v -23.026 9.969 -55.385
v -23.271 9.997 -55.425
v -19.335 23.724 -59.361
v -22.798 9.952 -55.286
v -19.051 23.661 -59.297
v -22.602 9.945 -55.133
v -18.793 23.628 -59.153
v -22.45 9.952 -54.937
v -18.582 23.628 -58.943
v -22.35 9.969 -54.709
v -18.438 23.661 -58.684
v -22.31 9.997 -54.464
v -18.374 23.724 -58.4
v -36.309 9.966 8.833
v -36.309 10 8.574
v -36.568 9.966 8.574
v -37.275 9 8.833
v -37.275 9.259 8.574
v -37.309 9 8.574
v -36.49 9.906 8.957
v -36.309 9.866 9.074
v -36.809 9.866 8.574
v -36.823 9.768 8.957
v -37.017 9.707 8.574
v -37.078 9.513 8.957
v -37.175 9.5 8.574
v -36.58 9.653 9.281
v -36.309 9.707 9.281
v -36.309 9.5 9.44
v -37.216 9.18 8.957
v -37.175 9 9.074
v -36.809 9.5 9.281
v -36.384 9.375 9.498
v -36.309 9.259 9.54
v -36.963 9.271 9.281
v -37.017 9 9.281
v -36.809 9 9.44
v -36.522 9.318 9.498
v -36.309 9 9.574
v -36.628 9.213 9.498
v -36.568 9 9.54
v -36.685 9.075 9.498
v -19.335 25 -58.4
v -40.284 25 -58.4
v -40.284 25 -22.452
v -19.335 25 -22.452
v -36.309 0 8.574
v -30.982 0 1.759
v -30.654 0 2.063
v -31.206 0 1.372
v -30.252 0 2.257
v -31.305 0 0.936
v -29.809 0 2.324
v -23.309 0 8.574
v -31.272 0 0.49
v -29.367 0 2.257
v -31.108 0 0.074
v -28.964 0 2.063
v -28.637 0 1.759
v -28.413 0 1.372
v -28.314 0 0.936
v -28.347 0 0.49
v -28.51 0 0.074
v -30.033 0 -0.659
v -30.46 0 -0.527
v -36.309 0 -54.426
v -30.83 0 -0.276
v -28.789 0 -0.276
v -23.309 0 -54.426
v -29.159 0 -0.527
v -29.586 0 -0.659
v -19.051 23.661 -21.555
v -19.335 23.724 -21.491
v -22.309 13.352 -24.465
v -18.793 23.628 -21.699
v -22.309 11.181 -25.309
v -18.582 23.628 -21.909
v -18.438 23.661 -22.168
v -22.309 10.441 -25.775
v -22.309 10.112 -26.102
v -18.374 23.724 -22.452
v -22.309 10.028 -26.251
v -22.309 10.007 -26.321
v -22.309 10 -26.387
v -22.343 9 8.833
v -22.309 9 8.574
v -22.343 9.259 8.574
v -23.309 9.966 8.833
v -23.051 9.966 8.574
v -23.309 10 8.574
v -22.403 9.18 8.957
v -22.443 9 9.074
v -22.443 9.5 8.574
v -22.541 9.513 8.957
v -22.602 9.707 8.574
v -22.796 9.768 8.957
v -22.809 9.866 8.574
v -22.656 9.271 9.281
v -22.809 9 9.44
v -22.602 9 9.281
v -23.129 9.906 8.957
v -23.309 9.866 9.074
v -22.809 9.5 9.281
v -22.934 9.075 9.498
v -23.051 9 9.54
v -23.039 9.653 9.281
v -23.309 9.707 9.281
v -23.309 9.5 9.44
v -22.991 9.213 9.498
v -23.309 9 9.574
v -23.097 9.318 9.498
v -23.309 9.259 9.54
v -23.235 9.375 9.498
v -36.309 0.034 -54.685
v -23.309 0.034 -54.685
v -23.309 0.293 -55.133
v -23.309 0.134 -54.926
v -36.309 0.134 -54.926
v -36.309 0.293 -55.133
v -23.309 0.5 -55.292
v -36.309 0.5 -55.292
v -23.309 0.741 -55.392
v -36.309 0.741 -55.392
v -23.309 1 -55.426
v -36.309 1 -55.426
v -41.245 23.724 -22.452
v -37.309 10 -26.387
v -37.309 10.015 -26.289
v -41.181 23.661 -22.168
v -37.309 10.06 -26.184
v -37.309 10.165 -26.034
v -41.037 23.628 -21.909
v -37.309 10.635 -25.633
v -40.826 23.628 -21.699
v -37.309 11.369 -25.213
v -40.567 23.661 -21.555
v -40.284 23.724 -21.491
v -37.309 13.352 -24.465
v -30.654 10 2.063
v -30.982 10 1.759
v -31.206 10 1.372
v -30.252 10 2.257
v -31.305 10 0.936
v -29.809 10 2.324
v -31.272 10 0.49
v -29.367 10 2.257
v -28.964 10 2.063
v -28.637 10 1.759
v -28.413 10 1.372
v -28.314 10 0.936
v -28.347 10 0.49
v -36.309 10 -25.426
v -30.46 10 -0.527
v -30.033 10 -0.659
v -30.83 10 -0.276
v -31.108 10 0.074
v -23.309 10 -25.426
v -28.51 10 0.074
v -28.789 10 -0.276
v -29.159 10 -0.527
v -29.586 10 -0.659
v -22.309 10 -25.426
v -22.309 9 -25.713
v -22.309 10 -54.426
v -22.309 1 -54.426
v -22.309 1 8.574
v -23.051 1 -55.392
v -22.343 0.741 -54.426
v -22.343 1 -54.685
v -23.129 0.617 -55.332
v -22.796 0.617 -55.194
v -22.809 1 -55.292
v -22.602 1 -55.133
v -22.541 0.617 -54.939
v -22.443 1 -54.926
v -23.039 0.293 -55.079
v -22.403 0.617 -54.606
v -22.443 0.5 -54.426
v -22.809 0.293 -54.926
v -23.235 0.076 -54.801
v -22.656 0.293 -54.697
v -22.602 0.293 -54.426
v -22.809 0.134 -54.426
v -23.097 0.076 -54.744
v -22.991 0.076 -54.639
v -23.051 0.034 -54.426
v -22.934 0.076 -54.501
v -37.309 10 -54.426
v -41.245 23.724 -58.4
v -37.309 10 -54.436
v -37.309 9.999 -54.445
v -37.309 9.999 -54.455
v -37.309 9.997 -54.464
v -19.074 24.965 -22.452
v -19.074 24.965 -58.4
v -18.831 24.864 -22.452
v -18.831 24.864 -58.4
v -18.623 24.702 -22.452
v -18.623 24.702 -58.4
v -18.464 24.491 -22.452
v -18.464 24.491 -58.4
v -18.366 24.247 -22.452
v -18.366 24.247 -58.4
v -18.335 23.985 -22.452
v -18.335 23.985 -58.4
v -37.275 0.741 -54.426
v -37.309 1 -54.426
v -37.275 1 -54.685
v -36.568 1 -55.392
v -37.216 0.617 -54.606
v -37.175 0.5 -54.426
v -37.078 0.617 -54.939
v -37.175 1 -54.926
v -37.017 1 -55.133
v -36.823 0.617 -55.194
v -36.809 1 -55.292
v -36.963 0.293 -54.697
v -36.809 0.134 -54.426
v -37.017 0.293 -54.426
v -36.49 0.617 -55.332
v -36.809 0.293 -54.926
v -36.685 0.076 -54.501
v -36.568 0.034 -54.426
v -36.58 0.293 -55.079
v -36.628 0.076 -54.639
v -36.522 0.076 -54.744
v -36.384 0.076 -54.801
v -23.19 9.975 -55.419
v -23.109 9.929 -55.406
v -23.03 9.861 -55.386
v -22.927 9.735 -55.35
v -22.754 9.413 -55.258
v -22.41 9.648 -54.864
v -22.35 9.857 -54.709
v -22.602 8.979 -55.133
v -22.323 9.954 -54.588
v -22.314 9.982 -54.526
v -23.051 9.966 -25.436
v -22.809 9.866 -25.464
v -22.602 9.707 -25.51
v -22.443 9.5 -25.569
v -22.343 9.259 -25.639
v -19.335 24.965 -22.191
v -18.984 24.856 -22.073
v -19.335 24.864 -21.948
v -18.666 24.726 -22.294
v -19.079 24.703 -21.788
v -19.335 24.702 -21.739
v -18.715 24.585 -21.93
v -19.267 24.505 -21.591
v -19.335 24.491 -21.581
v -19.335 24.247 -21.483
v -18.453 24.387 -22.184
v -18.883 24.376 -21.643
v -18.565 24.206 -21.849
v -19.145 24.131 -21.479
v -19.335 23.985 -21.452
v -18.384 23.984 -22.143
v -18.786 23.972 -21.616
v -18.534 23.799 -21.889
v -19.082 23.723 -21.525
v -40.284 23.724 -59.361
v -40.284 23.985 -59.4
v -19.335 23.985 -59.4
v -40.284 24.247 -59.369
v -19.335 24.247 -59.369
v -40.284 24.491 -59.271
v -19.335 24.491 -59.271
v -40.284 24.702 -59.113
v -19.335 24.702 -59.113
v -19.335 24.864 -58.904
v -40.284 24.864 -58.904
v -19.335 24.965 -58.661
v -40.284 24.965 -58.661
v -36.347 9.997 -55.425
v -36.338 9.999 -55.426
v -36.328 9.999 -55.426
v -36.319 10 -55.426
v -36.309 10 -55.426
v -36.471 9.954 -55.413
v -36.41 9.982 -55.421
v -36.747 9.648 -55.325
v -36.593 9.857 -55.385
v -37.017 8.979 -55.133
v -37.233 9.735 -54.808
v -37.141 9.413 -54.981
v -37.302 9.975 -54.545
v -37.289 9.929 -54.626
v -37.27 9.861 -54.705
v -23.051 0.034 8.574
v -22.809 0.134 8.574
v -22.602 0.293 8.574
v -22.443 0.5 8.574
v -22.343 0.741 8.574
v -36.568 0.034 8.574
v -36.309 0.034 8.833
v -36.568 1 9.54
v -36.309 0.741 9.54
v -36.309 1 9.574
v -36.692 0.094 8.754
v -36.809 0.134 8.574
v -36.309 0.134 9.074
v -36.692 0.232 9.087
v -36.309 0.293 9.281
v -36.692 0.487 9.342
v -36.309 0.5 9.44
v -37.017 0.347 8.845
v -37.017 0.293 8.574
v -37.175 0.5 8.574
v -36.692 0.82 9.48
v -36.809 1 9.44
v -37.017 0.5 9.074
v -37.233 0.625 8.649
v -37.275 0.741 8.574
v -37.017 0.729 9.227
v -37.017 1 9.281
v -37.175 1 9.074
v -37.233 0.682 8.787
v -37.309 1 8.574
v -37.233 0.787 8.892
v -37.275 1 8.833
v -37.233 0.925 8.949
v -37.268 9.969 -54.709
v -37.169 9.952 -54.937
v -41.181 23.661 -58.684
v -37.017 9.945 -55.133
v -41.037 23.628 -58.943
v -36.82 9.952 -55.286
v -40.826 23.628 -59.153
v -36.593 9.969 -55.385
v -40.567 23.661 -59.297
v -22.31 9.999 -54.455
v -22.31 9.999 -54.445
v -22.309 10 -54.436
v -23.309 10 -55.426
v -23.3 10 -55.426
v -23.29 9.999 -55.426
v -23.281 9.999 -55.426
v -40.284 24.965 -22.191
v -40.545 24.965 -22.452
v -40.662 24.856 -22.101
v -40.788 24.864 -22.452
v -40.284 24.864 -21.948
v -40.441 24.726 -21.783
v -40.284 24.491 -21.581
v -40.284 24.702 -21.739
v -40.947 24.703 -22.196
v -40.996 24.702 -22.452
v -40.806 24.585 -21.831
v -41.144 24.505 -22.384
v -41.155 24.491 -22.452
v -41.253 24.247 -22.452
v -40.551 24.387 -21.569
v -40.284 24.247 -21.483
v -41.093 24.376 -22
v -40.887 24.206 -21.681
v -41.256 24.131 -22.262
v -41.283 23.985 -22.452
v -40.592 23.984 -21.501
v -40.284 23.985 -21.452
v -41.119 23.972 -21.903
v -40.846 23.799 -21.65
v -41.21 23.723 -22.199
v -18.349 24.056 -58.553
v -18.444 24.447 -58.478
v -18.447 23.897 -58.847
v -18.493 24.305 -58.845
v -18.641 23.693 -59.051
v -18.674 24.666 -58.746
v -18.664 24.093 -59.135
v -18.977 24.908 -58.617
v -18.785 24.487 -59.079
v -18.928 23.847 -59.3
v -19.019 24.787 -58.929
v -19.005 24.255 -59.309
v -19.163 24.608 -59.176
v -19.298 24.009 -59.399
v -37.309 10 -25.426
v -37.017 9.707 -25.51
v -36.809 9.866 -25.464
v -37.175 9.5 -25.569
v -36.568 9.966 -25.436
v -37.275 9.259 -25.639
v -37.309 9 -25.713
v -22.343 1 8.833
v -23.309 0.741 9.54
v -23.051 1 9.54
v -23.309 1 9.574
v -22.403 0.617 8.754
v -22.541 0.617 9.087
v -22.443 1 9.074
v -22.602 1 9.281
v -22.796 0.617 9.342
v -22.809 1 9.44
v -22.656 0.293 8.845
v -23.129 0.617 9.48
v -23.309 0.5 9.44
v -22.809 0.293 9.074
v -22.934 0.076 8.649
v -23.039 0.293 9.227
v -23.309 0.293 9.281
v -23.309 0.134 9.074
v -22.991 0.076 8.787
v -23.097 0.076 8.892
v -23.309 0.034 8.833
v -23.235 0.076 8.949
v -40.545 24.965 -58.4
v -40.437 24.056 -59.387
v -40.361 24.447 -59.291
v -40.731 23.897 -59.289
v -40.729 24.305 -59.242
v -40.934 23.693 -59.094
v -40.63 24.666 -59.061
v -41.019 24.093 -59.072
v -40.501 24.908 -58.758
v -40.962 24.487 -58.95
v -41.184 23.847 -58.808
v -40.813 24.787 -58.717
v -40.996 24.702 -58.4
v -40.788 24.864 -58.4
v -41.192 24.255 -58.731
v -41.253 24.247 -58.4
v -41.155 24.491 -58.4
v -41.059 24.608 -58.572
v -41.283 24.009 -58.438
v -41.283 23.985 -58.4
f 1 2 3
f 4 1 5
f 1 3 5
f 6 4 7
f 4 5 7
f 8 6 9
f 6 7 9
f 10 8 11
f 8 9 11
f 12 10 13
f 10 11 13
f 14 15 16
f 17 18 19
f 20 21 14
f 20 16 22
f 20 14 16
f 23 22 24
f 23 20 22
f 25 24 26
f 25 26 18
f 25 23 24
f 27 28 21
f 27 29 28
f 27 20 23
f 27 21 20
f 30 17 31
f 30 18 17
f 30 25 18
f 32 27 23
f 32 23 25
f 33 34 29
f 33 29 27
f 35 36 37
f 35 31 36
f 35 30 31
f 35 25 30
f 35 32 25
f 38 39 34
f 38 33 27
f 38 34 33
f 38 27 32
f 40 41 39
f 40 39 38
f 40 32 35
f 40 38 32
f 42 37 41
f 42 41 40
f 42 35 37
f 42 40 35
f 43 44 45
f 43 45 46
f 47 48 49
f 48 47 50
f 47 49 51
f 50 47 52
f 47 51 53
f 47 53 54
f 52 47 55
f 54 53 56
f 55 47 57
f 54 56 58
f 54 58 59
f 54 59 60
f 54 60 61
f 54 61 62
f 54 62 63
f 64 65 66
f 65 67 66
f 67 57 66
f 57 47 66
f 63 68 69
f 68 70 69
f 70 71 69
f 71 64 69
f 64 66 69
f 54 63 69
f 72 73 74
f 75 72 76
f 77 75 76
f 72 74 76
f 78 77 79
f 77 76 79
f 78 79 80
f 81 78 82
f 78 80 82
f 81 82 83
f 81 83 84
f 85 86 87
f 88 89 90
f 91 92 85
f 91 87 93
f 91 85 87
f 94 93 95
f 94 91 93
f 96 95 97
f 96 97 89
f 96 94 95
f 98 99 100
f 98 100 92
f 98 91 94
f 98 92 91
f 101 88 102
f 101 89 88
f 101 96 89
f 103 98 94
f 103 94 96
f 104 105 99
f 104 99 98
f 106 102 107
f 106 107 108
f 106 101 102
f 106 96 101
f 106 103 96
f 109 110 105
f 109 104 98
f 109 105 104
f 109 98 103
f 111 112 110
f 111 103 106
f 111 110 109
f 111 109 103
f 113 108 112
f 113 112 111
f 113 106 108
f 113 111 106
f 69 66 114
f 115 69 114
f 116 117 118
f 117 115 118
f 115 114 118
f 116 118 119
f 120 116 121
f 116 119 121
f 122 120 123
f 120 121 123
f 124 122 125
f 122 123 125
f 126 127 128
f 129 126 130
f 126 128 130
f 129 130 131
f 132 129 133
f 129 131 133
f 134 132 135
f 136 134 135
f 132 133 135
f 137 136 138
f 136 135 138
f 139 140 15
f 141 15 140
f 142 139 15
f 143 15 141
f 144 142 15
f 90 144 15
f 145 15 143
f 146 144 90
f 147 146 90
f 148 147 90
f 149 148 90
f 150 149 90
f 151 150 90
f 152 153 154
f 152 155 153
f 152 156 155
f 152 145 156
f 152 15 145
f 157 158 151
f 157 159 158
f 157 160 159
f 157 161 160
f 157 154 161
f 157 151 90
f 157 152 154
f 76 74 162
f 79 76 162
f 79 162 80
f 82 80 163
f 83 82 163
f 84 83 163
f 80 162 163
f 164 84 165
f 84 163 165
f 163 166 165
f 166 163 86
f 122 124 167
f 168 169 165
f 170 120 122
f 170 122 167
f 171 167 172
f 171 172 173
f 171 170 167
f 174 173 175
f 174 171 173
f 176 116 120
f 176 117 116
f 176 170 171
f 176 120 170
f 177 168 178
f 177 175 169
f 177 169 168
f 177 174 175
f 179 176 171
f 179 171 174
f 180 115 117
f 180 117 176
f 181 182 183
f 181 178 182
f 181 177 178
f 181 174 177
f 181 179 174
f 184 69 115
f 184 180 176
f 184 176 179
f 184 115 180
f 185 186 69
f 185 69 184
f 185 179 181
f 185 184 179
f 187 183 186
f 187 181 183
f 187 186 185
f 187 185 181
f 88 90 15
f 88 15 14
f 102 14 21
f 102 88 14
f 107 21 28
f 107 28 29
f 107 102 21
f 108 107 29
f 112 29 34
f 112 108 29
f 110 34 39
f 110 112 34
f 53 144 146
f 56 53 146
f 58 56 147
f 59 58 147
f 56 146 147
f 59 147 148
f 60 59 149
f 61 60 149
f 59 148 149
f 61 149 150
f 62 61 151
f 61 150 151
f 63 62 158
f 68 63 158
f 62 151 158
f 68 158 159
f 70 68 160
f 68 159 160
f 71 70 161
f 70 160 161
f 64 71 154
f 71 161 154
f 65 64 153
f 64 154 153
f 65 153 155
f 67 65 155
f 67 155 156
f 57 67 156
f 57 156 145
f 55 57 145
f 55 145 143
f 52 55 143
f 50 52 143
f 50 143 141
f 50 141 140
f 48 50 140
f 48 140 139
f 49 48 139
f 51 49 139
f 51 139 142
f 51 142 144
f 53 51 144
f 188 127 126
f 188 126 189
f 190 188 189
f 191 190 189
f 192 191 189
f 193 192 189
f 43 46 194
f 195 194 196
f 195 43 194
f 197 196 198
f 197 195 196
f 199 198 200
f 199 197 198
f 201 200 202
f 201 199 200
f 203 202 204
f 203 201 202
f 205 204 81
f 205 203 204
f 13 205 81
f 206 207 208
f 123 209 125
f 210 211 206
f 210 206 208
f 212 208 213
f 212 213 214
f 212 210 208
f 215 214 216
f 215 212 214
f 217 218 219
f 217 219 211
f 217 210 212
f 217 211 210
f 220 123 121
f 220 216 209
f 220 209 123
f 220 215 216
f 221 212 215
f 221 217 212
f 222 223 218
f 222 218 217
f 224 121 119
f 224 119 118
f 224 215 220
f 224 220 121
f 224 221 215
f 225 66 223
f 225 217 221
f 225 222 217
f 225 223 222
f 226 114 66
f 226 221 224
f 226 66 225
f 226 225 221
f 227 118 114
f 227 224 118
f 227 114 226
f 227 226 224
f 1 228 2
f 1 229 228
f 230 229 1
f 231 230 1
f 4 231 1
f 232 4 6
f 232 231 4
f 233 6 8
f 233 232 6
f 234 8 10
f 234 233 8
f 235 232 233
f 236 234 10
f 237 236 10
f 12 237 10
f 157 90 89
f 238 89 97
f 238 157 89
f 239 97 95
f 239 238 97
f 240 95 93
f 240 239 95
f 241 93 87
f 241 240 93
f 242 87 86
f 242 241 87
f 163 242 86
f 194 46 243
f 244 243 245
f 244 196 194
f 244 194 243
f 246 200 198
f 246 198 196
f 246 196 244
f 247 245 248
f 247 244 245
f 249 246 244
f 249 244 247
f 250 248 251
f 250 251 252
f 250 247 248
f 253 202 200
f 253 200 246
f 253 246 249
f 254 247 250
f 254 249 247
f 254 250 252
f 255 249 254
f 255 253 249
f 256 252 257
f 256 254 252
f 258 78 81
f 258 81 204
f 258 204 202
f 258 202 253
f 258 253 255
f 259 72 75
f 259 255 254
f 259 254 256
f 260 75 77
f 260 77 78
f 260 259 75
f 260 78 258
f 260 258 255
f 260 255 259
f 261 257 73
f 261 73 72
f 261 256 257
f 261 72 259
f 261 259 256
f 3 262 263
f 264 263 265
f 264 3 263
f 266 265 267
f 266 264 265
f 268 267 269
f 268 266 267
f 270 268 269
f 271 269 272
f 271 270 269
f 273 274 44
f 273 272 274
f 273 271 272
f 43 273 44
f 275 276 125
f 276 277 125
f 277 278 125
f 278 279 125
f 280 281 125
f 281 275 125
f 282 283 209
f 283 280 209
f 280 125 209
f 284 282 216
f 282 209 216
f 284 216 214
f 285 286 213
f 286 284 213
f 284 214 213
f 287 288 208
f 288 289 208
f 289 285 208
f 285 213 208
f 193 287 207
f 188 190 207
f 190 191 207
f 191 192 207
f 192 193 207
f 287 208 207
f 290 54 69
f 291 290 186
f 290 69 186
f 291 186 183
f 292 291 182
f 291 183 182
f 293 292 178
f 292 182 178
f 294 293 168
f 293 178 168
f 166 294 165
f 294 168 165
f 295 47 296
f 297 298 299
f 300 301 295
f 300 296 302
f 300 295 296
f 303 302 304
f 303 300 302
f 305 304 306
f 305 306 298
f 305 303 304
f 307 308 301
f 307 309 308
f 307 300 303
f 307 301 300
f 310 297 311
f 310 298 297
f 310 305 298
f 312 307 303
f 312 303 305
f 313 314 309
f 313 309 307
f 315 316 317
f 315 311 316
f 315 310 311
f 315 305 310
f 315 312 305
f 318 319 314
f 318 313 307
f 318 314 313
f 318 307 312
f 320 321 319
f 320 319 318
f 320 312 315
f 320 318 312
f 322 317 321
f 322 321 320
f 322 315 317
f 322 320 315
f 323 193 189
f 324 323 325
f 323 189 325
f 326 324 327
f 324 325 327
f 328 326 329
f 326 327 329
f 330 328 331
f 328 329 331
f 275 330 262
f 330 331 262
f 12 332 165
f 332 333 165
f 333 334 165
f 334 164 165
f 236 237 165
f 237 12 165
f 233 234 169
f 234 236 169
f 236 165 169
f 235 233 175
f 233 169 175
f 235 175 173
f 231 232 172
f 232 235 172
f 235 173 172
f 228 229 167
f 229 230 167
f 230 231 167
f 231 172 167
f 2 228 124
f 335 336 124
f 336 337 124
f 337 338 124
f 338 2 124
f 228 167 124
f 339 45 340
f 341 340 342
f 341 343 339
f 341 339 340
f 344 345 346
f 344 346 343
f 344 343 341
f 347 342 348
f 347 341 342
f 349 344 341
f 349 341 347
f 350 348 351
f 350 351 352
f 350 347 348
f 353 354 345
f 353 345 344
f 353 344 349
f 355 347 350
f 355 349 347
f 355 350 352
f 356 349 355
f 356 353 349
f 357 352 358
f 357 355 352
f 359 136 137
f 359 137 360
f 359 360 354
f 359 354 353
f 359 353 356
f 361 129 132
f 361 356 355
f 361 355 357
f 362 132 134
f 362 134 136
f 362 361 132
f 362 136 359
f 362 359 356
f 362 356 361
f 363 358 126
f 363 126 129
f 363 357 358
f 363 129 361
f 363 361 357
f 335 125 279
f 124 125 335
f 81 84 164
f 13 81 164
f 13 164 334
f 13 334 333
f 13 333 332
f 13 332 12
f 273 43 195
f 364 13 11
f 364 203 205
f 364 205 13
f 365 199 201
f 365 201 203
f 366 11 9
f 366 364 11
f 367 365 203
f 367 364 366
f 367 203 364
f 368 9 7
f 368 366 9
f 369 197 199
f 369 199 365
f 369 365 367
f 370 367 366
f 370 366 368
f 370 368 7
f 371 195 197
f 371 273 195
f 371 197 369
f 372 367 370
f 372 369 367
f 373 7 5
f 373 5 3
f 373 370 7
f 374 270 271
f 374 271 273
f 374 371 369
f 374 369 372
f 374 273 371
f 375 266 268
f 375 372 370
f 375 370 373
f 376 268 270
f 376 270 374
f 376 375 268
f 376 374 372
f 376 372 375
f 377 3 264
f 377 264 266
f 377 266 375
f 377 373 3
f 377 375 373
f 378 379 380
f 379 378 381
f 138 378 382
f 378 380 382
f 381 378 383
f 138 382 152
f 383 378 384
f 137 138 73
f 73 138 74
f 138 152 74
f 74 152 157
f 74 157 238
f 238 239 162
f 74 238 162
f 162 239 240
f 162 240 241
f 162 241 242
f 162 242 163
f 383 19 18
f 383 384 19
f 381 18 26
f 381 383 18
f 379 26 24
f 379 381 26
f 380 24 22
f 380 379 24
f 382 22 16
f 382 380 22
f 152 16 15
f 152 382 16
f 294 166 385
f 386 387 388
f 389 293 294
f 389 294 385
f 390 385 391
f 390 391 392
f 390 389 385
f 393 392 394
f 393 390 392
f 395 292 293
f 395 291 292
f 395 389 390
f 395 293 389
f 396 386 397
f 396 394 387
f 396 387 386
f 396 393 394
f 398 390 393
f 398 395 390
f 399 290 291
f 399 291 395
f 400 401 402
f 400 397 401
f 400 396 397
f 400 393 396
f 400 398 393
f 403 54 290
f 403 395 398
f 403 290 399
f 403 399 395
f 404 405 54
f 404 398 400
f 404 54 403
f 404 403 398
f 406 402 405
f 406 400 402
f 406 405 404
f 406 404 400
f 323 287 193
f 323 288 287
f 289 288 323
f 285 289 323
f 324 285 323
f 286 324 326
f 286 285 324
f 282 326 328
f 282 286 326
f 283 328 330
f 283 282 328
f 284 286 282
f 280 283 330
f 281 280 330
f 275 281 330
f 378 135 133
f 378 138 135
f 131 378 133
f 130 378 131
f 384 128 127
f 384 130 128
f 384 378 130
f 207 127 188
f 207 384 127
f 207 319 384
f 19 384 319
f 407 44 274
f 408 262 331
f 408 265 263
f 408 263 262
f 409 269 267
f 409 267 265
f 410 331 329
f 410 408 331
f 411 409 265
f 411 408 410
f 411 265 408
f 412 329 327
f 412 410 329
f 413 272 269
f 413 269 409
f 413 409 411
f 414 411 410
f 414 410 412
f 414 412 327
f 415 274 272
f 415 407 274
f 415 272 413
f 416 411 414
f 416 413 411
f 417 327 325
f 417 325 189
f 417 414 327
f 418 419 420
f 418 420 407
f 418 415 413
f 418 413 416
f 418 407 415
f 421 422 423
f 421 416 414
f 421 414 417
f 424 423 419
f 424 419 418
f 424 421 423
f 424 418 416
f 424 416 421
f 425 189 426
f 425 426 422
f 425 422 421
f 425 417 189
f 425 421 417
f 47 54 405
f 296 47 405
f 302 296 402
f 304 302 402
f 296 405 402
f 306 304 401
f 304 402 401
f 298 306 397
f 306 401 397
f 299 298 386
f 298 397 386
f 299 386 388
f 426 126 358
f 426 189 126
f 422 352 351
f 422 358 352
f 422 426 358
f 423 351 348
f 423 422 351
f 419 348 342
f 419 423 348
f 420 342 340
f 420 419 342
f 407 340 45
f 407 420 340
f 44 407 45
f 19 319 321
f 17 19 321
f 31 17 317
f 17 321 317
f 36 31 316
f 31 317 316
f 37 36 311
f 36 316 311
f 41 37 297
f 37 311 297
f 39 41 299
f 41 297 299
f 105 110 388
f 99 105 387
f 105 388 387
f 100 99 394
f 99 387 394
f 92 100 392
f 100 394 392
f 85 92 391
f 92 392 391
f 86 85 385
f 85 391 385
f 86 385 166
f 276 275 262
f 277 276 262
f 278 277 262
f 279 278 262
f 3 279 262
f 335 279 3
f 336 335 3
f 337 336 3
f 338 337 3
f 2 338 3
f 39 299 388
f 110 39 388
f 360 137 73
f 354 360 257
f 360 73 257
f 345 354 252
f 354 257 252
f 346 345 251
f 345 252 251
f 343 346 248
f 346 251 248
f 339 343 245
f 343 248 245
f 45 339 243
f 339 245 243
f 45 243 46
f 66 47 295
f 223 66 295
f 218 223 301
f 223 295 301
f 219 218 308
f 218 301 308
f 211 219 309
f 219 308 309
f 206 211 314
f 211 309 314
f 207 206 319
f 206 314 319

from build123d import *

# Parameters (mm, degrees)
SKETCH2_W           = 15
SKETCH2_H           = 65
BOSS_EXTRUDE1_DEPTH = 10
SKETCH3_R           = 1.5
CUT_EXTRUDE1_DEPTH  = 68.557642573
SKETCH4_W           = 15
SKETCH4_H           = 30
BOSS_EXTRUDE2_DEPTH = 15
BOSS_EXTRUDE2_DRAFT = -16
FILLET1_R           = 1
FILLET2_R           = 1
FILLET3_R           = 1
FILLET4_R           = 1


with BuildPart() as part:
    # Sketch2 → Boss-Extrude1 (new body)
    with BuildSketch(Plane(origin=(0, 0, 0), x_dir=(1, 0, 0), z_dir=(0, 1, 0))):
        with Locations((-29.80941704, 22.926008969)):
            Rectangle(SKETCH2_W, SKETCH2_H)
    extrude(amount=BOSS_EXTRUDE1_DEPTH)

    # Sketch3 → Cut-Extrude1 (cut, through all)
    with BuildSketch(Plane(origin=(0, 10, 0), x_dir=(1, 0, 0), z_dir=(0, 1, 0))):
        with Locations(Location((-29.80941704, -0.823991031, 0), (0, 0, 270))):
            Circle(SKETCH3_R)
    extrude(amount=-CUT_EXTRUDE1_DEPTH, mode=Mode.SUBTRACT)


with BuildPart() as boss_extrude2_tool:
    # Sketch4 → Boss-Extrude2 (with draft: the straight prism first)
    with BuildSketch(Plane(origin=(0, 10, 0), x_dir=(1, 0, 0), z_dir=(0, 1, 0))):
        with Locations((-29.80941704, 40.426008969)):
            Rectangle(SKETCH4_W, SKETCH4_H)
    extrude(amount=BOSS_EXTRUDE2_DEPTH)
    # Boss-Extrude2: the draft: its side faces are tilted about the plane it starts from
    boss_extrude2_sides = [boss_extrude2_tool.faces().sort_by_distance(p)[0] for p in [
        (-37.30941704, 17.5, -40.426008969),
        (-29.80941704, 17.5, -25.426008969),
        (-22.30941704, 17.5, -40.426008969),
        (-29.80941704, 17.5, -55.426008969),
    ]]
    draft(boss_extrude2_sides, Plane(origin=(0, 10, 0), x_dir=(1, 0, 0), z_dir=(0, 1, 0)), BOSS_EXTRUDE2_DRAFT)


with BuildPart() as part_1:
    add(part.part)

    # Boss-Extrude2: add boss_extrude2_tool
    add(boss_extrude2_tool.part)

    # Fillet1
    fillet1_edges = [part_1.edges().sort_by_distance(p)[0] for p in [
        (-22.30941704, 10, -7.926008969),
        (-37.30941704, 10, -7.926008969),
        (-41.610597827, 25, -40.426008969),
        (-29.80941704, 25, -21.124828182),
        (-18.008236254, 25, -40.426008969),
        (-29.80941704, 25, -59.727189755),
        (-29.80941704, 10, 9.573991031),
    ]]
    fillet(fillet1_edges, radius=FILLET1_R)

    # Fillet2
    # the kernel refuses this fillet: 1 mm, written as the material it takes off along each edge
    with BuildSketch(Plane(origin=(-23.30941704, 9, 8.573991031), x_dir=(1, 0, 0), z_dir=(0, 0, 1))) as fillet2_piece_1_section:
        Polygon((0, 0), (FILLET2_R, 0), (FILLET2_R, FILLET2_R), (0, FILLET2_R), align=None)
    fillet2_piece_1 = extrude(amount=FILLET2_R, mode=Mode.PRIVATE)
    fillet2_piece_1 = fillet2_piece_1 - Plane(origin=(-23.30941704, 9, 8.573991031), x_dir=(-0.7071067811865475, -0.7071067811865475, 0), z_dir=(0, 0, 1)) * Sphere(FILLET2_R, mode=Mode.PRIVATE)
    add(fillet2_piece_1, mode=Mode.SUBTRACT)
    with BuildSketch(Plane(origin=(-23.30941704, 1, -54.426008969), x_dir=(1, 0, 0), z_dir=(0, -1, 0))) as fillet2_piece_2_section:
        Polygon((0, 0), (FILLET2_R, 0), (FILLET2_R, -FILLET2_R), (0, -FILLET2_R), align=None)
    fillet2_piece_2 = extrude(amount=FILLET2_R, mode=Mode.PRIVATE)
    fillet2_piece_2 = fillet2_piece_2 - Plane(origin=(-23.30941704, 1, -54.426008969), x_dir=(-0.7071067811865475, 0, 0.7071067811865475), z_dir=(0, -1, 0)) * Sphere(FILLET2_R, mode=Mode.PRIVATE)
    add(fillet2_piece_2, mode=Mode.SUBTRACT)
    with BuildSketch(Plane(origin=(-22.30941704, -2.5, 9.573991031), x_dir=(-1, 0, 0), z_dir=(0, 1, 0))) as fillet2_piece_3:
        with BuildLine():
            CenterArc((FILLET2_R, -FILLET2_R), FILLET2_R, 90, 90)
            Line((0, -FILLET2_R), (0, 0))
            Line((0, 0), (FILLET2_R, 0))
        make_face()
    extrude(amount=11.5, mode=Mode.SUBTRACT)
    with BuildSketch(Plane(origin=(-39.80941704, 0, -55.426008969), x_dir=(0, 1, 0), z_dir=(1, 0, 0))) as fillet2_piece_4:
        with BuildLine():
            CenterArc((FILLET2_R, FILLET2_R), FILLET2_R, 180, 90)
            Line((0, FILLET2_R), (0, 0))
            Line((0, 0), (FILLET2_R, 0))
        make_face()
    extrude(amount=16.5, mode=Mode.SUBTRACT)
    with BuildSketch(Plane(origin=(-22.30941704, 0, -54.426008969), x_dir=(-1, 0, 0), z_dir=(0, 0, 1))) as fillet2_piece_5:
        with BuildLine():
            CenterArc((FILLET2_R, -FILLET2_R), FILLET2_R, 90, 90)
            Line((0, -FILLET2_R), (0, 0))
            Line((0, 0), (FILLET2_R, 0))
        make_face()
    extrude(amount=66.5, mode=Mode.SUBTRACT)
    with BuildSketch(Plane(origin=(-37.30941704, -2.5, -55.426008969), x_dir=(0, 0, 1), z_dir=(0, 1, 0))) as fillet2_piece_6_section:
        with BuildLine():
            CenterArc((FILLET2_R, FILLET2_R), FILLET2_R, 180, 90)
            Line((0, FILLET2_R), (0, 0))
            Line((0, 0), (FILLET2_R, 0))
        make_face()
    fillet2_piece_6 = extrude(amount=15, mode=Mode.PRIVATE)
    fillet2_piece_6 = split(fillet2_piece_6, bisect_by=Plane(origin=(-33.997421639, -1.550300601, -55.426008969), z_dir=(-0.9612616959383189, -0.2756373558169994, 0)), keep=Keep.TOP, mode=Mode.PRIVATE)
    fillet2_piece_6 = split(fillet2_piece_6, bisect_by=Plane(origin=(-37.30941704, -1.550300601, -52.114013567), z_dir=(0, -0.2756373558169994, -0.9612616959383189)), keep=Keep.TOP, mode=Mode.PRIVATE)
    add(fillet2_piece_6, mode=Mode.SUBTRACT)
    with BuildSketch(Plane(origin=(-37.30941704, -2.5, -55.426008969), x_dir=(0, 0, 1), z_dir=(0, 1, 0))) as fillet2_piece_7_section:
        with BuildLine():
            CenterArc((FILLET2_R, FILLET2_R), FILLET2_R, 180, 90)
            Line((0, FILLET2_R), (0, 0))
            Line((0, 0), (FILLET2_R, 0))
        make_face()
    fillet2_piece_7 = extrude(amount=15, mode=Mode.PRIVATE)
    fillet2_piece_7 = split(fillet2_piece_7, bisect_by=Plane(origin=(-33.997421639, -1.550300601, -55.426008969), z_dir=(0.9612616959383189, 0.2756373558169994, 0)), keep=Keep.TOP, mode=Mode.PRIVATE)
    fillet2_piece_7 = split(fillet2_piece_7, bisect_by=Plane(origin=(-37.30941704, -1.550300601, -52.114013567), z_dir=(0, -0.2756373558169994, -0.9612616959383189)), keep=Keep.TOP, mode=Mode.PRIVATE)
    add(fillet2_piece_7, mode=Mode.SUBTRACT)
    with BuildSketch(Plane(origin=(-37.30941704, -2.5, -55.426008969), x_dir=(0, 0, 1), z_dir=(0, 1, 0))) as fillet2_piece_8_section:
        with BuildLine():
            CenterArc((FILLET2_R, FILLET2_R), FILLET2_R, 180, 90)
            Line((0, FILLET2_R), (0, 0))
            Line((0, 0), (FILLET2_R, 0))
        make_face()
    fillet2_piece_8 = extrude(amount=15, mode=Mode.PRIVATE)
    fillet2_piece_8 = split(fillet2_piece_8, bisect_by=Plane(origin=(-33.997421639, -1.550300601, -55.426008969), z_dir=(-0.9612616959383189, -0.2756373558169994, 0)), keep=Keep.TOP, mode=Mode.PRIVATE)
    fillet2_piece_8 = split(fillet2_piece_8, bisect_by=Plane(origin=(-37.30941704, -1.550300601, -52.114013567), z_dir=(0, 0.2756373558169994, 0.9612616959383189)), keep=Keep.TOP, mode=Mode.PRIVATE)
    add(fillet2_piece_8, mode=Mode.SUBTRACT)
    with BuildSketch(Plane(origin=(-22.30941704, 1, -55.426008969), x_dir=(-1, 0, 0), z_dir=(0, 1, 0))) as fillet2_piece_9_section:
        with BuildLine():
            CenterArc((FILLET2_R, FILLET2_R), FILLET2_R, 180, 90)
            Line((0, FILLET2_R), (0, 0))
            Line((0, 0), (FILLET2_R, 0))
        make_face()
    fillet2_piece_9 = extrude(amount=11.5, mode=Mode.PRIVATE)
    fillet2_piece_9 = split(fillet2_piece_9, bisect_by=Plane(origin=(-22.30941704, 1.683783567, -53.04137228), z_dir=(0, -0.2756373558169994, -0.9612616959383189)), keep=Keep.TOP, mode=Mode.PRIVATE)
    fillet2_piece_9 = split(fillet2_piece_9, bisect_by=Plane(origin=(-24.694053729, 1.683783567, -55.426008969), z_dir=(0.9612616959383189, -0.2756373558169994, 0)), keep=Keep.TOP, mode=Mode.PRIVATE)
    add(fillet2_piece_9, mode=Mode.SUBTRACT)
    with BuildSketch(Plane(origin=(-22.30941704, 1, -55.426008969), x_dir=(-1, 0, 0), z_dir=(0, 1, 0))) as fillet2_piece_10_section:
        with BuildLine():
            CenterArc((FILLET2_R, FILLET2_R), FILLET2_R, 180, 90)
            Line((0, FILLET2_R), (0, 0))
            Line((0, 0), (FILLET2_R, 0))
        make_face()
    fillet2_piece_10 = extrude(amount=11.5, mode=Mode.PRIVATE)
    fillet2_piece_10 = split(fillet2_piece_10, bisect_by=Plane(origin=(-22.30941704, 1.683783567, -53.04137228), z_dir=(0, 0.2756373558169994, 0.9612616959383189)), keep=Keep.TOP, mode=Mode.PRIVATE)
    fillet2_piece_10 = split(fillet2_piece_10, bisect_by=Plane(origin=(-24.694053729, 1.683783567, -55.426008969), z_dir=(0.9612616959383189, -0.2756373558169994, 0)), keep=Keep.TOP, mode=Mode.PRIVATE)
    add(fillet2_piece_10, mode=Mode.SUBTRACT)
    with BuildSketch(Plane(origin=(-22.30941704, 1, -55.426008969), x_dir=(-1, 0, 0), z_dir=(0, 1, 0))) as fillet2_piece_11_section:
        with BuildLine():
            CenterArc((FILLET2_R, FILLET2_R), FILLET2_R, 180, 90)
            Line((0, FILLET2_R), (0, 0))
            Line((0, 0), (FILLET2_R, 0))
        make_face()
    fillet2_piece_11 = extrude(amount=11.5, mode=Mode.PRIVATE)
    fillet2_piece_11 = split(fillet2_piece_11, bisect_by=Plane(origin=(-22.30941704, 1.683783567, -53.04137228), z_dir=(0, -0.2756373558169994, -0.9612616959383189)), keep=Keep.TOP, mode=Mode.PRIVATE)
    fillet2_piece_11 = split(fillet2_piece_11, bisect_by=Plane(origin=(-24.694053729, 1.683783567, -55.426008969), z_dir=(-0.9612616959383189, 0.2756373558169994, 0)), keep=Keep.TOP, mode=Mode.PRIVATE)
    add(fillet2_piece_11, mode=Mode.SUBTRACT)

    # Fillet3
    # the kernel refuses this fillet: 1 mm, written as the material it takes off along each edge
    with BuildSketch(Plane(origin=(-36.30941704, 9, 8.573991031), x_dir=(-1, 0, 0), z_dir=(0, 0, 1))) as fillet3_piece_1_section:
        Polygon((0, 0), (FILLET3_R, 0), (FILLET3_R, -FILLET3_R), (0, -FILLET3_R), align=None)
    fillet3_piece_1 = extrude(amount=FILLET3_R, mode=Mode.PRIVATE)
    fillet3_piece_1 = fillet3_piece_1 - Plane(origin=(-36.30941704, 9, 8.573991031), x_dir=(0.7071067811865475, -0.7071067811865475, 0), z_dir=(0, 0, 1)) * Sphere(FILLET3_R, mode=Mode.PRIVATE)
    add(fillet3_piece_1, mode=Mode.SUBTRACT)
    with BuildSketch(Plane(origin=(-36.30941704, 1, -54.426008969), x_dir=(-1, 0, 0), z_dir=(0, -1, 0))) as fillet3_piece_2_section:
        Polygon((0, 0), (FILLET3_R, 0), (FILLET3_R, FILLET3_R), (0, FILLET3_R), align=None)
    fillet3_piece_2 = extrude(amount=FILLET3_R, mode=Mode.PRIVATE)
    fillet3_piece_2 = fillet3_piece_2 - Plane(origin=(-36.30941704, 1, -54.426008969), x_dir=(0.7071067811865475, 0, 0.7071067811865475), z_dir=(0, -1, 0)) * Sphere(FILLET3_R, mode=Mode.PRIVATE)
    add(fillet3_piece_2, mode=Mode.SUBTRACT)
    with BuildSketch(Plane(origin=(-23.30941704, 1, 8.573991031), x_dir=(0, 0, 1), z_dir=(0, -1, 0))) as fillet3_piece_3_section:
        Polygon((0, 0), (FILLET3_R, 0), (FILLET3_R, -FILLET3_R), (0, -FILLET3_R), align=None)
    fillet3_piece_3 = extrude(amount=FILLET3_R, mode=Mode.PRIVATE)
    fillet3_piece_3 = fillet3_piece_3 - Plane(origin=(-23.30941704, 1, 8.573991031), x_dir=(-0.7071067811865476, 0, -0.7071067811865475), z_dir=(0, -1, 0)) * Sphere(FILLET3_R, mode=Mode.PRIVATE)
    add(fillet3_piece_3, mode=Mode.SUBTRACT)
    with BuildSketch(Plane(origin=(-36.30941704, 1, 8.573991031), x_dir=(0, 0, 1), z_dir=(-1, 0, 0))) as fillet3_piece_4_section:
        Polygon((0, 0), (FILLET3_R, 0), (FILLET3_R, -FILLET3_R), (0, -FILLET3_R), align=None)
    fillet3_piece_4 = extrude(amount=FILLET3_R, mode=Mode.PRIVATE)
    fillet3_piece_4 = fillet3_piece_4 - Plane(origin=(-36.30941704, 1, 8.573991031), x_dir=(0, 0.7071067811865475, -0.7071067811865475), z_dir=(-1, 0, 0)) * Sphere(FILLET3_R, mode=Mode.PRIVATE)
    add(fillet3_piece_4, mode=Mode.SUBTRACT)
    with BuildSketch(Plane(origin=(-37.30941704, 1, 9.573991031), x_dir=(1, 0, 0), z_dir=(0, 1, 0))) as fillet3_piece_5:
        with BuildLine():
            CenterArc((FILLET3_R, FILLET3_R), FILLET3_R, 180, 90)
            Line((0, FILLET3_R), (0, 0))
            Line((0, 0), (FILLET3_R, 0))
        make_face()
    extrude(amount=8, mode=Mode.SUBTRACT)
    with BuildSketch(Plane(origin=(-23.30941704, 0, 9.573991031), x_dir=(0, 0, -1), z_dir=(-1, 0, 0))) as fillet3_piece_6:
        with BuildLine():
            CenterArc((FILLET3_R, -FILLET3_R), FILLET3_R, 90, 90)
            Line((0, -FILLET3_R), (0, 0))
            Line((0, 0), (FILLET3_R, 0))
        make_face()
    extrude(amount=13, mode=Mode.SUBTRACT)
    with BuildSketch(Plane(origin=(-37.30941704, 0, 8.573991031), x_dir=(1, 0, 0), z_dir=(0, 0, -1))) as fillet3_piece_7:
        with BuildLine():
            CenterArc((FILLET3_R, -FILLET3_R), FILLET3_R, 90, 90)
            Line((0, -FILLET3_R), (0, 0))
            Line((0, 0), (FILLET3_R, 0))
        make_face()
    extrude(amount=63, mode=Mode.SUBTRACT)

    # Fillet4
    # the kernel refuses this fillet: 1 mm, written as the material it takes off along each edge
    with BuildSketch(Plane(origin=(-19.335281076, 24, -58.400144933), x_dir=(-0.586629189217781, 0.7784832277628361, -0.22322647345161653), z_dir=(0.6714721557028178, 0.31344902014780923, -0.6714721557028178))) as fillet4_piece_1_section:
        Polygon((-2.551826428, -2.551826428), (2.551826428, -2.551826428), (2.551826428, 2.551826428), (-2.551826428, 2.551826428), align=None)
    fillet4_piece_1 = extrude(amount=2.551826428, mode=Mode.PRIVATE)
    fillet4_piece_1 = split(fillet4_piece_1, bisect_by=Plane(origin=(-19.335281076, 24, -58.400144933), z_dir=(0.265727678029987, 0.9267025424900824, -0.265727678029987)), keep=Keep.TOP, mode=Mode.PRIVATE)
    fillet4_piece_1 = split(fillet4_piece_1, bisect_by=Plane(origin=(-19.335281076, 24, -58.400144933), z_dir=(0, 0, -1)), keep=Keep.TOP, mode=Mode.PRIVATE)
    fillet4_piece_1 = split(fillet4_piece_1, bisect_by=Plane(origin=(-19.335281076, 24, -58.400144933), z_dir=(1, 0, 0)), keep=Keep.TOP, mode=Mode.PRIVATE)
    fillet4_piece_1 = split(fillet4_piece_1, bisect_by=Plane(origin=(-19.335281076, 23.724362644, -59.361406629), z_dir=(0, 0.2756373558169994, 0.9612616959383189)), keep=Keep.TOP, mode=Mode.PRIVATE)
    fillet4_piece_1 = split(fillet4_piece_1, bisect_by=Plane(origin=(-18.37401938, 23.724362644, -58.400144933), z_dir=(-0.9612616959383189, 0.2756373558169994, 0)), keep=Keep.TOP, mode=Mode.PRIVATE)
    fillet4_piece_1 = split(fillet4_piece_1, bisect_by=Plane(origin=(-19.335281076, 25, -58.400144933), z_dir=(0, -1, 0)), keep=Keep.TOP, mode=Mode.PRIVATE)
    fillet4_piece_1 = fillet4_piece_1 - Plane(origin=(-19.335281076, 24, -58.400144933), x_dir=(-0.6714721557028178, -0.31344902014780923, 0.6714721557028178), z_dir=(-0.586629189217781, 0.7784832277628361, -0.22322647345161653)) * Sphere(FILLET4_R, mode=Mode.PRIVATE)
    add(fillet4_piece_1, mode=Mode.SUBTRACT)
    with BuildSketch(Plane(origin=(-19.335281076, 24, -22.451873004), x_dir=(0.586629189217781, -0.7784832277628361, -0.22322647345161653), z_dir=(0.6714721557028178, 0.31344902014780923, 0.6714721557028178))) as fillet4_piece_2_section:
        Polygon((-2.551826428, -2.551826428), (2.551826428, -2.551826428), (2.551826428, 2.551826428), (-2.551826428, 2.551826428), align=None)
    fillet4_piece_2 = extrude(amount=2.551826428, mode=Mode.PRIVATE)
    fillet4_piece_2 = split(fillet4_piece_2, bisect_by=Plane(origin=(-19.335281076, 24, -22.451873004), z_dir=(0.265727678029987, 0.9267025424900824, 0.265727678029987)), keep=Keep.TOP, mode=Mode.PRIVATE)
    fillet4_piece_2 = split(fillet4_piece_2, bisect_by=Plane(origin=(-19.335281076, 24, -22.451873004), z_dir=(0, 0, 1)), keep=Keep.TOP, mode=Mode.PRIVATE)
    fillet4_piece_2 = split(fillet4_piece_2, bisect_by=Plane(origin=(-19.335281076, 24, -22.451873004), z_dir=(1, 0, 0)), keep=Keep.TOP, mode=Mode.PRIVATE)
    fillet4_piece_2 = split(fillet4_piece_2, bisect_by=Plane(origin=(-19.335281076, 23.724362644, -21.490611308), z_dir=(0, 0.2756373558169994, -0.9612616959383189)), keep=Keep.TOP, mode=Mode.PRIVATE)
    fillet4_piece_2 = split(fillet4_piece_2, bisect_by=Plane(origin=(-18.37401938, 23.724362644, -22.451873004), z_dir=(-0.9612616959383189, 0.2756373558169994, 0)), keep=Keep.TOP, mode=Mode.PRIVATE)
    fillet4_piece_2 = split(fillet4_piece_2, bisect_by=Plane(origin=(-19.335281076, 25, -22.451873004), z_dir=(0, -1, 0)), keep=Keep.TOP, mode=Mode.PRIVATE)
    fillet4_piece_2 = fillet4_piece_2 - Plane(origin=(-19.335281076, 24, -22.451873004), x_dir=(-0.6714721557028178, -0.31344902014780923, -0.6714721557028178), z_dir=(0.586629189217781, -0.7784832277628361, -0.22322647345161653)) * Sphere(FILLET4_R, mode=Mode.PRIVATE)
    add(fillet4_piece_2, mode=Mode.SUBTRACT)
    with BuildSketch(Plane(origin=(-40.283553005, 24, -22.451873004), x_dir=(0.22322647345161664, -0.7784832277628361, 0.5866291892177808), z_dir=(-0.6714721557028177, 0.3134490201478092, 0.6714721557028178))) as fillet4_piece_3_section:
        Polygon((-2.551826428, -2.551826428), (2.551826428, -2.551826428), (2.551826428, 2.551826428), (-2.551826428, 2.551826428), align=None)
    fillet4_piece_3 = extrude(amount=2.551826428, mode=Mode.PRIVATE)
    fillet4_piece_3 = split(fillet4_piece_3, bisect_by=Plane(origin=(-40.283553005, 24, -22.451873004), z_dir=(-0.2657276780299869, 0.9267025424900824, 0.265727678029987)), keep=Keep.TOP, mode=Mode.PRIVATE)
    fillet4_piece_3 = split(fillet4_piece_3, bisect_by=Plane(origin=(-40.283553005, 24, -22.451873004), z_dir=(-1, 0, 0)), keep=Keep.TOP, mode=Mode.PRIVATE)
    fillet4_piece_3 = split(fillet4_piece_3, bisect_by=Plane(origin=(-40.283553005, 24, -22.451873004), z_dir=(0, 0, 1)), keep=Keep.TOP, mode=Mode.PRIVATE)
    fillet4_piece_3 = split(fillet4_piece_3, bisect_by=Plane(origin=(-41.244814701, 23.724362644, -22.451873004), z_dir=(0.9612616959383189, 0.2756373558169994, 0)), keep=Keep.TOP, mode=Mode.PRIVATE)
    fillet4_piece_3 = split(fillet4_piece_3, bisect_by=Plane(origin=(-40.283553005, 23.724362644, -21.490611308), z_dir=(0, 0.2756373558169994, -0.9612616959383189)), keep=Keep.TOP, mode=Mode.PRIVATE)
    fillet4_piece_3 = split(fillet4_piece_3, bisect_by=Plane(origin=(-40.283553005, 25, -22.451873004), z_dir=(0, -1, 0)), keep=Keep.TOP, mode=Mode.PRIVATE)
    fillet4_piece_3 = fillet4_piece_3 - Plane(origin=(-40.283553005, 24, -22.451873004), x_dir=(0.6714721557028177, -0.3134490201478092, -0.6714721557028178), z_dir=(0.22322647345161664, -0.7784832277628361, 0.5866291892177808)) * Sphere(FILLET4_R, mode=Mode.PRIVATE)
    add(fillet4_piece_3, mode=Mode.SUBTRACT)
    with BuildSketch(Plane(origin=(-40.283553005, 24, -58.400144933), x_dir=(-0.22322647345161636, 0.778483227762836, 0.586629189217781), z_dir=(-0.6714721557028179, 0.3134490201478093, -0.6714721557028177))) as fillet4_piece_4_section:
        Polygon((-2.551826428, -2.551826428), (2.551826428, -2.551826428), (2.551826428, 2.551826428), (-2.551826428, 2.551826428), align=None)
    fillet4_piece_4 = extrude(amount=2.551826428, mode=Mode.PRIVATE)
    fillet4_piece_4 = split(fillet4_piece_4, bisect_by=Plane(origin=(-40.283553005, 24, -58.400144933), z_dir=(-0.26572767802998704, 0.9267025424900824, -0.265727678029987)), keep=Keep.TOP, mode=Mode.PRIVATE)
    fillet4_piece_4 = split(fillet4_piece_4, bisect_by=Plane(origin=(-40.283553005, 24, -58.400144933), z_dir=(-1, 0, 0)), keep=Keep.TOP, mode=Mode.PRIVATE)
    fillet4_piece_4 = split(fillet4_piece_4, bisect_by=Plane(origin=(-40.283553005, 24, -58.400144933), z_dir=(0, 0, -1)), keep=Keep.TOP, mode=Mode.PRIVATE)
    fillet4_piece_4 = split(fillet4_piece_4, bisect_by=Plane(origin=(-41.244814701, 23.724362644, -58.400144933), z_dir=(0.9612616959383189, 0.2756373558169994, 0)), keep=Keep.TOP, mode=Mode.PRIVATE)
    fillet4_piece_4 = split(fillet4_piece_4, bisect_by=Plane(origin=(-40.283553005, 23.724362644, -59.361406629), z_dir=(0, 0.2756373558169994, 0.9612616959383189)), keep=Keep.TOP, mode=Mode.PRIVATE)
    fillet4_piece_4 = split(fillet4_piece_4, bisect_by=Plane(origin=(-40.283553005, 25, -58.400144933), z_dir=(0, -1, 0)), keep=Keep.TOP, mode=Mode.PRIVATE)
    fillet4_piece_4 = fillet4_piece_4 - Plane(origin=(-40.283553005, 24, -58.400144933), x_dir=(0.6714721557028179, -0.3134490201478093, 0.6714721557028177), z_dir=(-0.22322647345161636, 0.778483227762836, 0.586629189217781)) * Sphere(FILLET4_R, mode=Mode.PRIVATE)
    add(fillet4_piece_4, mode=Mode.SUBTRACT)
    with BuildSketch(Plane(origin=(-18.44189522, 23.487651457, -59.293530789), x_dir=(-0.9640481321639595, 0.25543383844084533, -0.07324447453942981), z_dir=(-0.26572767802993547, -0.9267025424901008, 0.26572767802997477))) as fillet4_piece_5_section:
        with BuildLine():
            CenterArc((FILLET4_R * 0.92670254249, -FILLET4_R), FILLET4_R, 90, 85.64269976)
            Line((-FILLET4_R * 0.0704071078139, -FILLET4_R * 0.924024048078), (0, 0))
            Line((0, 0), (FILLET4_R * 0.92670254249, 0))
        make_face()
    fillet4_piece_5 = extrude(amount=17.973443193, mode=Mode.PRIVATE)
    fillet4_piece_5 = fillet4_piece_5 - Plane(origin=(-23.30941704, 23.487651457, -54.426008969), x_dir=(-1, 0, 0), z_dir=(0, -1, 0)) * Cylinder(1, 40, mode=Mode.PRIVATE)
    add(fillet4_piece_5, mode=Mode.SUBTRACT)
    with BuildSketch(Plane(origin=(-22.925043327, 7.853055994, -26.041635256), x_dir=(-0.9640481321639451, 0.2554338384408567, 0.07324447453957714), z_dir=(0.26572767802998704, 0.9267025424900825, 0.26572767802998704))) as fillet4_piece_6_section:
        with BuildLine():
            CenterArc((FILLET4_R * 0.92670254249, -FILLET4_R), FILLET4_R, 90, 85.64269976)
            Line((-FILLET4_R * 0.070407107814, -FILLET4_R * 0.924024048078), (0, 0))
            Line((0, 0), (FILLET4_R * 0.92670254249, 0))
        make_face()
    fillet4_piece_6 = extrude(amount=16.871212439, mode=Mode.PRIVATE)
    fillet4_piece_6 = split(fillet4_piece_6, bisect_by=Plane(origin=(-22.30941704, 7.853055994, -26.041635256), z_dir=(1, 0, 0)), keep=Keep.TOP, mode=Mode.PRIVATE)
    add(fillet4_piece_6, mode=Mode.SUBTRACT)
    with BuildSketch(Plane(origin=(-36.693790753, 7.853055994, -26.041635256), x_dir=(-0.07324447453957462, 0.25543383844085743, -0.9640481321639451), z_dir=(-0.265727678029987, 0.9267025424900825, 0.26572767802998704))) as fillet4_piece_7_section:
        with BuildLine():
            CenterArc((FILLET4_R * 0.92670254249, -FILLET4_R), FILLET4_R, 90, 85.64269976)
            Line((-FILLET4_R * 0.070407107814, -FILLET4_R * 0.924024048078), (0, 0))
            Line((0, 0), (FILLET4_R * 0.92670254249, 0))
        make_face()
    fillet4_piece_7 = extrude(amount=16.871212439, mode=Mode.PRIVATE)
    fillet4_piece_7 = split(fillet4_piece_7, bisect_by=Plane(origin=(-37.30941704, 7.853055994, -26.041635256), z_dir=(-1, 0, 0)), keep=Keep.TOP, mode=Mode.PRIVATE)
    add(fillet4_piece_7, mode=Mode.SUBTRACT)
    with BuildSketch(Plane(origin=(-41.17693886, 23.487651457, -59.293530789), x_dir=(-0.073244474539126, 0.25543383844094353, 0.9640481321639565), z_dir=(0.2657276780299394, -0.9267025424901079, 0.2657276780299461))) as fillet4_piece_8_section:
        with BuildLine():
            CenterArc((FILLET4_R * 0.926702542491, -FILLET4_R), FILLET4_R, 90, 85.64269976)
            Line((-FILLET4_R * 0.0704071078136, -FILLET4_R * 0.924024048078), (0, 0))
            Line((0, 0), (FILLET4_R * 0.92670254249, 0))
        make_face()
    fillet4_piece_8 = extrude(amount=17.973443193, mode=Mode.PRIVATE)
    fillet4_piece_8 = fillet4_piece_8 - Plane(origin=(-36.30941704, 23.487651457, -54.426008969), x_dir=(0, 0, 1), z_dir=(0, -1, 0)) * Cylinder(1, 40, mode=Mode.PRIVATE)
    add(fillet4_piece_8, mode=Mode.SUBTRACT)


solid = part_1.part
